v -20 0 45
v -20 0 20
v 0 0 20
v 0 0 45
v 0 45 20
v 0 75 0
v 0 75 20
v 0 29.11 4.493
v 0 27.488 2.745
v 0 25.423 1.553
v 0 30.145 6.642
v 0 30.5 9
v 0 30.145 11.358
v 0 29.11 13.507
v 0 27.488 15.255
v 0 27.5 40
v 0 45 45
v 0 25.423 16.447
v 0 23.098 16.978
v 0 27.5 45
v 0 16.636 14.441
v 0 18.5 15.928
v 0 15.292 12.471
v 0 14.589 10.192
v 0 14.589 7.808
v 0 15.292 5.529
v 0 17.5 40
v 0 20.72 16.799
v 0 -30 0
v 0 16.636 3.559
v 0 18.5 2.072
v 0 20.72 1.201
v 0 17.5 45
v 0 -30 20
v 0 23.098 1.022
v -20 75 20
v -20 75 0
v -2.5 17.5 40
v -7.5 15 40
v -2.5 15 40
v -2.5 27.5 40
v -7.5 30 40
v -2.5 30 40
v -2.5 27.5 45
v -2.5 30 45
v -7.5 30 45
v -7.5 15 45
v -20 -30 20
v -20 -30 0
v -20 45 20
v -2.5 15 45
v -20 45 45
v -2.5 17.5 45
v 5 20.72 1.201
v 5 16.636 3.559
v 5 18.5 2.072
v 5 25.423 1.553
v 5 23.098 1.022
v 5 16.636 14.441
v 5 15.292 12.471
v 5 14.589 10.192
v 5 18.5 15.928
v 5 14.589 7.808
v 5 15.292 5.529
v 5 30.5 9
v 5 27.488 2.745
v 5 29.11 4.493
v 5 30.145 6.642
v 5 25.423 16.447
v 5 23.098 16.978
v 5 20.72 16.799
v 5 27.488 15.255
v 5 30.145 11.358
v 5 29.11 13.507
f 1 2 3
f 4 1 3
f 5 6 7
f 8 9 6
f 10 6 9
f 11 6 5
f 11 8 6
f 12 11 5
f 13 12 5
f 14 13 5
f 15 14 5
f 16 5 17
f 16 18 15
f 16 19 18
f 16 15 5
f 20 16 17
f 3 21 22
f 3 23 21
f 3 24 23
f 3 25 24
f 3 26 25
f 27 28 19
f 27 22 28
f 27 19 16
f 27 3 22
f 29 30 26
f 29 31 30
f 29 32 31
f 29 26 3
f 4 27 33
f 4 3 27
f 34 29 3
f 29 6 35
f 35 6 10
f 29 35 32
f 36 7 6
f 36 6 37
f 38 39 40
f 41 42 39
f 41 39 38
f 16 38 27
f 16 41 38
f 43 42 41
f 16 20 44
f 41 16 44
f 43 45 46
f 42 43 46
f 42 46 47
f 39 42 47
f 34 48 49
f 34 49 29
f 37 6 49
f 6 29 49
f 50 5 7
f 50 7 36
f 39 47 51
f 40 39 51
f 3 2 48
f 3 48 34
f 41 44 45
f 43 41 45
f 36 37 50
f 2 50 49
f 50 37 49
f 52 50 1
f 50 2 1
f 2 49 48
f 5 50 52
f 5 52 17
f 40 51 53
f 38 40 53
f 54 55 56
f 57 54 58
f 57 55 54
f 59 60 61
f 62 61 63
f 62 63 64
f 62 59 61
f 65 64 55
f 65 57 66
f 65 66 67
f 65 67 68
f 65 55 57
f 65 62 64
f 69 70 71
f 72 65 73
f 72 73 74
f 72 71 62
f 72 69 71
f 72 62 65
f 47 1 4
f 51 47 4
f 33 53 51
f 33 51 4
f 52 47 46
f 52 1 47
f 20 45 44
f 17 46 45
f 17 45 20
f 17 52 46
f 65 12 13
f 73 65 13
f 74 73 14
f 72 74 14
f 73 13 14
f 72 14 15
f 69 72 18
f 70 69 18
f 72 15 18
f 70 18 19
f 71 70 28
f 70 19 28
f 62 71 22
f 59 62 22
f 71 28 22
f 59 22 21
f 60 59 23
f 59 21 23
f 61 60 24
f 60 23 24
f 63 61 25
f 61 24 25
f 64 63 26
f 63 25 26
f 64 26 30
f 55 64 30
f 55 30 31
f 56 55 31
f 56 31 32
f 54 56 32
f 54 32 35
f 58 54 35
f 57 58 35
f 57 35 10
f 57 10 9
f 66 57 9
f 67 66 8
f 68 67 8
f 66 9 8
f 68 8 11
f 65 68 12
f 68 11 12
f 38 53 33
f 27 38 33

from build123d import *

# Parameters (mm, degrees)
F0_W     = 20
F0_H     = 45
F1_DEPTH = 45
F3_DEPTH = 5
F4_R     = 8
F5_DEPTH = 5
F6_W     = 20
F6_H     = 20
F7_DEPTH = 30
F8_W     = 20
F8_H     = 20
F9_DEPTH = 30


with BuildPart() as f1:
    # F0 (on Top) → F1 (new body)
    with BuildSketch(Plane.XY):
        with Locations((-10, 22.5)):
            Rectangle(F0_W, F0_H)
    extrude(amount=F1_DEPTH)

    # F2 (on face) → F3 (cut)
    with BuildSketch(Plane.XY.offset(45)):
        Polygon((0, 17.5), (0, 27.5), (-2.5, 27.5), (-2.5, 30), (-7.5, 30), (-7.5, 15), (-2.5, 15), (-2.5, 17.5), align=None)
    extrude(amount=-F3_DEPTH, mode=Mode.SUBTRACT)

    # F4 (on face) → F5 (join)
    with BuildSketch(Plane.YZ):
        with Locations((22.5, 9)):
            Circle(F4_R)
    extrude(amount=F5_DEPTH)

    # F6 (on face) → F7 (join)
    with BuildSketch(Plane.XZ):
        with Locations((-10, 10)):
            Rectangle(F6_W, F6_H)
    extrude(amount=F7_DEPTH)

    # F8 (on face) → F9 (join)
    with BuildSketch(Plane(origin=(0, 45, 0), x_dir=(-1, 0, 0), z_dir=(0, 1, 0))):
        with Locations((10, 10)):
            Rectangle(F8_W, F8_H)
    extrude(amount=F9_DEPTH)


solid = f1.part
